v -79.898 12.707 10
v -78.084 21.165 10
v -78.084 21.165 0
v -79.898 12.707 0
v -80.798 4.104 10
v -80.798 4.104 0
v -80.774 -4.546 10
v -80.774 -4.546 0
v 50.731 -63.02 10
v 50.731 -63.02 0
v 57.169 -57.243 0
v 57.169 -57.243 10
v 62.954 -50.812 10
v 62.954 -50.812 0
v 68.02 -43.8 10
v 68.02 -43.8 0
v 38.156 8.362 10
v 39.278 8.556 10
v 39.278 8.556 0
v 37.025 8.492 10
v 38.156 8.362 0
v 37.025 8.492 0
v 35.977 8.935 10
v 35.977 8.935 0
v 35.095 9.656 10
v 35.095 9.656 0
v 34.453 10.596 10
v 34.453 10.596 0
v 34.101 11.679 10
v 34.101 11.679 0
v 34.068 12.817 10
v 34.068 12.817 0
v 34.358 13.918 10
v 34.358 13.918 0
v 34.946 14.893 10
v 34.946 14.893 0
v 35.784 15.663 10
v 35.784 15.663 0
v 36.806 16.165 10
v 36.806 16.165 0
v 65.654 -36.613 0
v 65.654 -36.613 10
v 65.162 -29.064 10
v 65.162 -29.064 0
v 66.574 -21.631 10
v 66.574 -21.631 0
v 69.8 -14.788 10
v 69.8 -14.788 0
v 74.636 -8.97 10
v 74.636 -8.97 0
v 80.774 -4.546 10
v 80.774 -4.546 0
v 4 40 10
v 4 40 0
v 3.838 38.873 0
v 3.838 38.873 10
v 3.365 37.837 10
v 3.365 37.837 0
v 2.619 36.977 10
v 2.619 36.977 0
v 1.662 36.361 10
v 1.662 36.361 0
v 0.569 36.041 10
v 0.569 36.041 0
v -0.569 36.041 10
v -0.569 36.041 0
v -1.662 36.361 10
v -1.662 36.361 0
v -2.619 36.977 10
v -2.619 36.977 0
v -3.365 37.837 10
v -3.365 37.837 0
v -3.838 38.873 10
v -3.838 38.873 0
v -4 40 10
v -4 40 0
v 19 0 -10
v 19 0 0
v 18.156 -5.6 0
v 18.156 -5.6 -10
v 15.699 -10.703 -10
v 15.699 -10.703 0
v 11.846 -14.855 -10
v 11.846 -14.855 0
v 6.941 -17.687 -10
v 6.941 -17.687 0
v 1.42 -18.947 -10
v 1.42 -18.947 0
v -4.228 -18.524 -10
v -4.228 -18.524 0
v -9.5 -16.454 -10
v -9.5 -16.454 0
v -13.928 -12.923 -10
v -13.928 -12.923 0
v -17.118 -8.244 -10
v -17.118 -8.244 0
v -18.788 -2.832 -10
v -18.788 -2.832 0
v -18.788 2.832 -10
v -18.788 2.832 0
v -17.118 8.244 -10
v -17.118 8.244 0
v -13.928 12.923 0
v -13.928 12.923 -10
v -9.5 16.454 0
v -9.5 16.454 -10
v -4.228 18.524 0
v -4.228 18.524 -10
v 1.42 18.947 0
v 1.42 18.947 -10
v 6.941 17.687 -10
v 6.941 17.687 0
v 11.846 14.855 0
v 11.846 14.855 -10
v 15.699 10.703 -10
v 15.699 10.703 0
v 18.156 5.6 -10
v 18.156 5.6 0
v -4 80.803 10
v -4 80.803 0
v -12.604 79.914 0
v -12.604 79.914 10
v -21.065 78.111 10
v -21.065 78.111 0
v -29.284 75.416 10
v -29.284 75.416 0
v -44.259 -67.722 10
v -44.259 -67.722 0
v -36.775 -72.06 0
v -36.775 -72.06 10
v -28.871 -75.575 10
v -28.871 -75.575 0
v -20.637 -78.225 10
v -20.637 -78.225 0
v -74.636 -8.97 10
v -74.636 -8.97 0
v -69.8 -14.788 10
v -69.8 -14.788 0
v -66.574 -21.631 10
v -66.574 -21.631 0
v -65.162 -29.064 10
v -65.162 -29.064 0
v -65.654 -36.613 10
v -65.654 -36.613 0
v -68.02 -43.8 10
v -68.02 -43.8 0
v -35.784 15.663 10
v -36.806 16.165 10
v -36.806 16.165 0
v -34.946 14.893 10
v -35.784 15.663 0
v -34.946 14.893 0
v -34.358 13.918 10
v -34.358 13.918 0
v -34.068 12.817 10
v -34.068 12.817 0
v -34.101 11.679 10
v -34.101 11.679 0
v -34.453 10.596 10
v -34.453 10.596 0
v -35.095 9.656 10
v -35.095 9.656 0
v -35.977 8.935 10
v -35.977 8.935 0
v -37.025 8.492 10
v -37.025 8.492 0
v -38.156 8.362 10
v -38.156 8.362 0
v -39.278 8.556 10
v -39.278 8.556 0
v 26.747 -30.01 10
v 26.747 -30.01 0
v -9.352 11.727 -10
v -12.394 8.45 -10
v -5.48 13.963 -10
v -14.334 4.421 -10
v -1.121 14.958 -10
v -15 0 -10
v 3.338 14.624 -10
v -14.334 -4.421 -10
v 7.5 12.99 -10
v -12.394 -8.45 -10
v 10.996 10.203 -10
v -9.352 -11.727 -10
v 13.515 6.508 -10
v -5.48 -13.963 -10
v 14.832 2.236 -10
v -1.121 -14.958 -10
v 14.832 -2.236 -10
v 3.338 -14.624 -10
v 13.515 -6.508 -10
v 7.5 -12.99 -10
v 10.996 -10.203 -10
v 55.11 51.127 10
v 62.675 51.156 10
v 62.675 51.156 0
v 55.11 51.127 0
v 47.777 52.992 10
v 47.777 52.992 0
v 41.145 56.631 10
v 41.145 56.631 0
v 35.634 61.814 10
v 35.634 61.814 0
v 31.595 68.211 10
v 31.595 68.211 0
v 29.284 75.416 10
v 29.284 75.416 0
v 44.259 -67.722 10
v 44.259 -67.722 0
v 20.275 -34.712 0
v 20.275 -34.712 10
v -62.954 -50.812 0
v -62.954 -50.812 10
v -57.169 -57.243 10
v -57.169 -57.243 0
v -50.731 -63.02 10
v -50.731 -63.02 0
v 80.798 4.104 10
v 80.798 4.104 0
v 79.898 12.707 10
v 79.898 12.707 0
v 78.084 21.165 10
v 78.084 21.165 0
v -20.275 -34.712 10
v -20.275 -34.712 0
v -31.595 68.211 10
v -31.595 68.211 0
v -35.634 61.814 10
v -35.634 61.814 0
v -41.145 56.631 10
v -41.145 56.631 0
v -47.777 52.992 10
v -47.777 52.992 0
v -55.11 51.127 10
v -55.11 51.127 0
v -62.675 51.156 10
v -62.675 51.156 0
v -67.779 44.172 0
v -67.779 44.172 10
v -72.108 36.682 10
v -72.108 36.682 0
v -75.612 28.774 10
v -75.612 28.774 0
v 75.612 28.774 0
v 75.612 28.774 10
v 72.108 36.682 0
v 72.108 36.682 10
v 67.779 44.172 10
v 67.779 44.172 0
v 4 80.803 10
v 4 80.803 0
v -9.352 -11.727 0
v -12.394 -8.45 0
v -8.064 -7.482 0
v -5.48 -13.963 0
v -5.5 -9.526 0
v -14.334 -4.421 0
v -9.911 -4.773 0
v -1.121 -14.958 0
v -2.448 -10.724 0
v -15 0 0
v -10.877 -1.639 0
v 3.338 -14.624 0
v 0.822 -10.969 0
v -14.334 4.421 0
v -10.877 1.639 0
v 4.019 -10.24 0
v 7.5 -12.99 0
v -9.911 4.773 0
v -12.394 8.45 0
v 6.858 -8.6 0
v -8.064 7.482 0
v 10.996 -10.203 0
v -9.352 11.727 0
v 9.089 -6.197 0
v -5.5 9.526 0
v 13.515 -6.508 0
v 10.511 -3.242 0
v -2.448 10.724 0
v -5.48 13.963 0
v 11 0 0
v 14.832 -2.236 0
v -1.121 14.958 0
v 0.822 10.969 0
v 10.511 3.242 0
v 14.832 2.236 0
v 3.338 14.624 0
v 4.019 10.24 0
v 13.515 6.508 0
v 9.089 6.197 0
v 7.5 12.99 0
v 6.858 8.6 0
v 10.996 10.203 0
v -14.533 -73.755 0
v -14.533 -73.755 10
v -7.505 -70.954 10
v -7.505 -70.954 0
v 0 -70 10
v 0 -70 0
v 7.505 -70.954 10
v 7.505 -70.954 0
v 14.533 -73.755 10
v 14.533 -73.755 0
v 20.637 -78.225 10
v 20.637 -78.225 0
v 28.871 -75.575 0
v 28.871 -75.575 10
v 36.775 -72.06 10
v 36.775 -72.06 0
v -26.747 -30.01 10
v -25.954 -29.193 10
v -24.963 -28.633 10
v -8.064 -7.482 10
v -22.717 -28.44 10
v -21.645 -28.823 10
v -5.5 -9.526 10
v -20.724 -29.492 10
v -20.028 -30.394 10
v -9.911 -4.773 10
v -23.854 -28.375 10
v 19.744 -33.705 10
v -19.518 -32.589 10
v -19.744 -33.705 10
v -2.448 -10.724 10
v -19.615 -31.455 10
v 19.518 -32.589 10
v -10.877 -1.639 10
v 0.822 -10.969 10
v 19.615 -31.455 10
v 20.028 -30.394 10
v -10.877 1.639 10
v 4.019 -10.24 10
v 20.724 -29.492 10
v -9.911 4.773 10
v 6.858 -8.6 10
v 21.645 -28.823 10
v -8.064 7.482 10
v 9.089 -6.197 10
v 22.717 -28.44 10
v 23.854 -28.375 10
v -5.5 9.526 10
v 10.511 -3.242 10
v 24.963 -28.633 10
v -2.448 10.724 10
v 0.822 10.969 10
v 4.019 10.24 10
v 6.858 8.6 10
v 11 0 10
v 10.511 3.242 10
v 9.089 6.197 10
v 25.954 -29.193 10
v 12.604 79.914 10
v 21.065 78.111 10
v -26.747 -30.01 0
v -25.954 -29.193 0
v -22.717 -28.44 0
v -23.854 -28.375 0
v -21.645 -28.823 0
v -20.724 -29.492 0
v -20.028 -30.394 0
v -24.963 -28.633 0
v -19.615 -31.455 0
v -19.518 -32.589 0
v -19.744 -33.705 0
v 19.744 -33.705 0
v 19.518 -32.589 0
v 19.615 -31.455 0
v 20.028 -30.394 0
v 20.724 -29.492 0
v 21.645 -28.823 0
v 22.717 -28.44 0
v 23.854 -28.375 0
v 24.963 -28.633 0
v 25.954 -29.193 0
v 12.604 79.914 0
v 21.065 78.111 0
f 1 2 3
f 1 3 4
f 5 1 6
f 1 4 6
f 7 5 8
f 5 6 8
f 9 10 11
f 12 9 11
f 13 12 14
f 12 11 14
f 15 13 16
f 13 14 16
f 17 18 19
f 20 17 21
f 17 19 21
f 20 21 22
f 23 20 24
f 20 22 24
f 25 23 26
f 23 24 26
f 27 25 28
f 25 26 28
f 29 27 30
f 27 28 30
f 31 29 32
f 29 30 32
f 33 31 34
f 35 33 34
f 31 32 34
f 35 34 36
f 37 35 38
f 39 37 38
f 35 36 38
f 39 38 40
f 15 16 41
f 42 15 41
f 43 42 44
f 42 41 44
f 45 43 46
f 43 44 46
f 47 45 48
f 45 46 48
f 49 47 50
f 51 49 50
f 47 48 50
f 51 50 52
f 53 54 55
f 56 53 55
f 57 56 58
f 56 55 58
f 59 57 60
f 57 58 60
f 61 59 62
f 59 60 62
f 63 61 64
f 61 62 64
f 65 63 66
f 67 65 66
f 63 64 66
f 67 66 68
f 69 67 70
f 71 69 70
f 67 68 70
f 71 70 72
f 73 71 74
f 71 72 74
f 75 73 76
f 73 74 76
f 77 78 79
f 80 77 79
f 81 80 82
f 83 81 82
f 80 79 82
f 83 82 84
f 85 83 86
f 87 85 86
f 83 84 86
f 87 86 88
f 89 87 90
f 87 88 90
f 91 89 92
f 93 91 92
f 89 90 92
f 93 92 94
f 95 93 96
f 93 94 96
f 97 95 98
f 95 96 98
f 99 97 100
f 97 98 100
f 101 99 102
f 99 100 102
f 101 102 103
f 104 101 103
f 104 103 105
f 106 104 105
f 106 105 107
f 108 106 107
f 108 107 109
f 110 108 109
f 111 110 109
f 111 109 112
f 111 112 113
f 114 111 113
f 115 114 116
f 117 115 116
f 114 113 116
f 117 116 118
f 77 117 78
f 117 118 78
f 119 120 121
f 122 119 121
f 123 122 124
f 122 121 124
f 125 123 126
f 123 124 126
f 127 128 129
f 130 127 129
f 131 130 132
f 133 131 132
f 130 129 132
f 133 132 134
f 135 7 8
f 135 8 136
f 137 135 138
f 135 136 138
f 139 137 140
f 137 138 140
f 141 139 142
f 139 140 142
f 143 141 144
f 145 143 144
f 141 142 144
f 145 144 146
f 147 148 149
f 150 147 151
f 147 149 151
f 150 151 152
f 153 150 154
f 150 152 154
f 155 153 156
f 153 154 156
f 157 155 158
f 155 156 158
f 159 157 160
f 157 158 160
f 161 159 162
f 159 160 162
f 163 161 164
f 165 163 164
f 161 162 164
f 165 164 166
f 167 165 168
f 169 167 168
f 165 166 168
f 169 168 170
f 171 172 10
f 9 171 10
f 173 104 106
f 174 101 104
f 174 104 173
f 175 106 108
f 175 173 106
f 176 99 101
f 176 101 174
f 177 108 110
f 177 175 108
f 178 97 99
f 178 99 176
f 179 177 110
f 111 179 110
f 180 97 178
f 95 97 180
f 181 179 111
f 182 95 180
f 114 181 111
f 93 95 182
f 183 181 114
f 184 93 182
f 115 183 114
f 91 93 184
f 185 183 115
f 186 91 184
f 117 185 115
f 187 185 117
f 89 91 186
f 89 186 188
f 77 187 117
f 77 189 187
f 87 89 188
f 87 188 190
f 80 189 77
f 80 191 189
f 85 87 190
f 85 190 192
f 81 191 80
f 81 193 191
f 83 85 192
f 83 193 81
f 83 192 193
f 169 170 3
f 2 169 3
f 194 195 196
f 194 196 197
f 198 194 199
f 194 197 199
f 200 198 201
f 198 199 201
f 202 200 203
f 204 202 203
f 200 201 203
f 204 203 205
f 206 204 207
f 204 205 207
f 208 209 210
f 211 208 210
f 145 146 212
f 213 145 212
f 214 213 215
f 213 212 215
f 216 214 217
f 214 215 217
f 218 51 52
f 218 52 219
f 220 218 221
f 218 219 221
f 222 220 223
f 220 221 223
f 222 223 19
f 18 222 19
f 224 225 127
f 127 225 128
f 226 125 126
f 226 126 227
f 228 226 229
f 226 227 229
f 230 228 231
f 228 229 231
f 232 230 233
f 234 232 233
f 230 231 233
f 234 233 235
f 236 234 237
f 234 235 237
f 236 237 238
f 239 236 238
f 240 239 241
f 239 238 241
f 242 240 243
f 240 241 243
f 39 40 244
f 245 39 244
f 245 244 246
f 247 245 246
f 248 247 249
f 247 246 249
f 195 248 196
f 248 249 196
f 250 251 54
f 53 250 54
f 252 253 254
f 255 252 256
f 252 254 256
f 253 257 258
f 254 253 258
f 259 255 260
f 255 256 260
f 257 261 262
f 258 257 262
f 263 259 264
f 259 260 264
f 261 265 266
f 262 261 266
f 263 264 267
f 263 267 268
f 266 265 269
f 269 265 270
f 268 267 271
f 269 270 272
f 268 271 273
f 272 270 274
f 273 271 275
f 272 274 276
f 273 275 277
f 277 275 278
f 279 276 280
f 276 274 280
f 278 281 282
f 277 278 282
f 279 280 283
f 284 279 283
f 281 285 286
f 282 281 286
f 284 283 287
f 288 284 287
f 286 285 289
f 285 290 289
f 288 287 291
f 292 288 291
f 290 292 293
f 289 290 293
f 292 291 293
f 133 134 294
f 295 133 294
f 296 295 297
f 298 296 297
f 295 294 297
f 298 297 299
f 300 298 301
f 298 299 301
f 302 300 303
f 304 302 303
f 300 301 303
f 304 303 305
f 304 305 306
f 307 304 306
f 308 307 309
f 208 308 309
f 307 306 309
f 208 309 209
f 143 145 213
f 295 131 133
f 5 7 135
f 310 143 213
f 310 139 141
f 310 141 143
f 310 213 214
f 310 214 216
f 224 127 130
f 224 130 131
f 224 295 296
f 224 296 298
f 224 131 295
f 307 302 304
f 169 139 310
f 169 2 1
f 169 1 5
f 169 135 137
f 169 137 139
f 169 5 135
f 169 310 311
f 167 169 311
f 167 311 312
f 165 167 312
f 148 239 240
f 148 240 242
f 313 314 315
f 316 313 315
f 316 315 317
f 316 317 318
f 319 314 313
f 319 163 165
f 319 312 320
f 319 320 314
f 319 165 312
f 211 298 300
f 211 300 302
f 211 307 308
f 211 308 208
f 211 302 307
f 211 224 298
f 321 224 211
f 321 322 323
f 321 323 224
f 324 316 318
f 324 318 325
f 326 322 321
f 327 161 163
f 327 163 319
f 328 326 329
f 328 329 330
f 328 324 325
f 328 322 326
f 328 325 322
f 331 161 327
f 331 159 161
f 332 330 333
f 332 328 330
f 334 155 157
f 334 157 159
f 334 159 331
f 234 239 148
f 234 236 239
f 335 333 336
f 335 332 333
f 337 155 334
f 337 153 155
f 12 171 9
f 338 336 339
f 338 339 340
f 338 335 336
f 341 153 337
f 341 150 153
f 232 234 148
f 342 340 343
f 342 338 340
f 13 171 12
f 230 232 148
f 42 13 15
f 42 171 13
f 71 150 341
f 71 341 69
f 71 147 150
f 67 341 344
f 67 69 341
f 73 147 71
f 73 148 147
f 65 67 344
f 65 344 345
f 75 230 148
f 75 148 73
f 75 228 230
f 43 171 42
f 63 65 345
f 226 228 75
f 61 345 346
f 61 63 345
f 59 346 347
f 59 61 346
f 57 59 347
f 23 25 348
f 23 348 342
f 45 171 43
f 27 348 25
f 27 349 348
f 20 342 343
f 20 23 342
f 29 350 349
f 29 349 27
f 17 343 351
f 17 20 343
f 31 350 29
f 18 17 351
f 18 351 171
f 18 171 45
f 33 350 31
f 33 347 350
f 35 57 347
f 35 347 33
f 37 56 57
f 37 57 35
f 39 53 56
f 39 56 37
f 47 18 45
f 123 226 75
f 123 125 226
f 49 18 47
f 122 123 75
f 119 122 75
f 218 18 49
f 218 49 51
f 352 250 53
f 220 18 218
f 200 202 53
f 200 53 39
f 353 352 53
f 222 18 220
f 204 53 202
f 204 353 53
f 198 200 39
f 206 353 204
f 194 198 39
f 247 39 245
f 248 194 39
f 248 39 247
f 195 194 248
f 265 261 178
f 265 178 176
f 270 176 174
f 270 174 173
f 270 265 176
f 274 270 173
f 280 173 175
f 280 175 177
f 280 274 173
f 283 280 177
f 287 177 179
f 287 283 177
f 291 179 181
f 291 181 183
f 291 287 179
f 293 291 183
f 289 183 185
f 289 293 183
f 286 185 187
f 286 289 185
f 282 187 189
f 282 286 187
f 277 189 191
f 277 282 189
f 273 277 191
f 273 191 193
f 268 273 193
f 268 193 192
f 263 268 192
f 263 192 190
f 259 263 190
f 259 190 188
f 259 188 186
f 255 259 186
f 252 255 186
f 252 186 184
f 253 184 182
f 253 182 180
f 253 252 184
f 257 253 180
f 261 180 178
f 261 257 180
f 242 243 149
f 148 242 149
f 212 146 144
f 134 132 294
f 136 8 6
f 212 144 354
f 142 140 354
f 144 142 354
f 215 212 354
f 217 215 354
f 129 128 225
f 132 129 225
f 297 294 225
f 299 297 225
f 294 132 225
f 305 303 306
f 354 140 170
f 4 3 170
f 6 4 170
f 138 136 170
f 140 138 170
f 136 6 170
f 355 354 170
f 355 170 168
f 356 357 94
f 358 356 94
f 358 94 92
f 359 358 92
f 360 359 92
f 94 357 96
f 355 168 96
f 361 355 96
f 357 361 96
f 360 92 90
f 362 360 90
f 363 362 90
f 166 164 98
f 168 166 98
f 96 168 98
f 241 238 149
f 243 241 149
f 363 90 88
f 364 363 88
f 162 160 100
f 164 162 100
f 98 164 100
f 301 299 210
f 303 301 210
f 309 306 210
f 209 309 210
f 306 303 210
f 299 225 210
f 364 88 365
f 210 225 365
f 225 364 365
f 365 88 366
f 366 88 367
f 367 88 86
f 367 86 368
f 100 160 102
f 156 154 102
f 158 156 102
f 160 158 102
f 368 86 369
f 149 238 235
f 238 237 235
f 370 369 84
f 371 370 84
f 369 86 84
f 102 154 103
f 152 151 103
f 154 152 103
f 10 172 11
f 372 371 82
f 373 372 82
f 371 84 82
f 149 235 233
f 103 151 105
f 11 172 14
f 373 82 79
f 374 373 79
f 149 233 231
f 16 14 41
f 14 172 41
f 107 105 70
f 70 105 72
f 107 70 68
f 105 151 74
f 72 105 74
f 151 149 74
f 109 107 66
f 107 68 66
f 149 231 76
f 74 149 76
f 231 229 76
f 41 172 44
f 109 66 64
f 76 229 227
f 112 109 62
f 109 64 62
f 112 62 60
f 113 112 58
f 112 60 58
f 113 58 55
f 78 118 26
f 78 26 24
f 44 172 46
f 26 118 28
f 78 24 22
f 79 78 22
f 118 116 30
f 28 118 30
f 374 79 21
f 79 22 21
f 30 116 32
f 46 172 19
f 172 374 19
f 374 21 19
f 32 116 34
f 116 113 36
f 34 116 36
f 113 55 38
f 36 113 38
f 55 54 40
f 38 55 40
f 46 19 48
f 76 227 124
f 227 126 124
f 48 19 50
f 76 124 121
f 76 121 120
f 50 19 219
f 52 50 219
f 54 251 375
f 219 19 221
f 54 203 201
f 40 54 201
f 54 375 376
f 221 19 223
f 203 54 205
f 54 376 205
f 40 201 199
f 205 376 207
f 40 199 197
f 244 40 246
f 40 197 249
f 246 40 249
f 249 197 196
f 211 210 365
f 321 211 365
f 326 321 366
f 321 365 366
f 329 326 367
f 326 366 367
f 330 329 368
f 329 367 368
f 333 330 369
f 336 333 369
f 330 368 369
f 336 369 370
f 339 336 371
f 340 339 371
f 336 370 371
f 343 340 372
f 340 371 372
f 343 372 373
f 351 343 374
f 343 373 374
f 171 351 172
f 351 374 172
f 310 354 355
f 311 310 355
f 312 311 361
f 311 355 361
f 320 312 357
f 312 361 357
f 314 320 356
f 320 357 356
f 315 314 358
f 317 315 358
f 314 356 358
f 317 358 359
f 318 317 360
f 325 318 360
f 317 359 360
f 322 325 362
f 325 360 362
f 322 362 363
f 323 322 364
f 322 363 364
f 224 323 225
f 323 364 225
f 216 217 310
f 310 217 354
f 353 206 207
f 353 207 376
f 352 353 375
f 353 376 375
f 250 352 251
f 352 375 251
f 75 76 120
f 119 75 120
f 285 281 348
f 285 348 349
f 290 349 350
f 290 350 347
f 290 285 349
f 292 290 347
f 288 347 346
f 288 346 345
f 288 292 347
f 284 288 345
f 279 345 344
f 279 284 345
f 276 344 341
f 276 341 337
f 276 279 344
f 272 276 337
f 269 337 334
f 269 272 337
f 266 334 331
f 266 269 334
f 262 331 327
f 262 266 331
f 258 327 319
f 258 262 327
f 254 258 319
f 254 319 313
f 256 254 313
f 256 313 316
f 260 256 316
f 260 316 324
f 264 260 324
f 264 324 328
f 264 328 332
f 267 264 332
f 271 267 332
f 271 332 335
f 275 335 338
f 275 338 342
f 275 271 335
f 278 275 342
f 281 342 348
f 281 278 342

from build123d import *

# Parameters (mm, degrees)
SKETCH2_R           = 11
BOSS_EXTRUDE1_DEPTH = 10
SKETCH4_R           = 19
SKETCH4_R_2         = 15
BOSS_EXTRUDE2_DEPTH = 10


with BuildPart() as part:
    # Sketch2 → Boss-Extrude1 (new body)
    with BuildSketch(Plane.XY):
        with BuildLine():
            Line((26.747478069, -30.009538766), (50.730734825, -63.019659758))
            ThreePointArc((50.730734825, -63.019659758), (60.147924382, -54.104640877), (68.019750294, -43.79952673))
            ThreePointArc((68.019750294, -43.79952673), (66.573956141, -21.631189606), (80.773849811, -4.546444618))
            ThreePointArc((80.773849811, -4.546444618), (80.462602989, 8.417511037), (78.084053221, 21.165197956))
            Line((78.084053221, 21.165197956), (39.278328629, 8.55645371))
            ThreePointArc((39.278328629, 8.55645371), (34.238034587, 11.124611797), (36.806192674, 16.16490584))
            Line((36.806192674, 16.16490584), (75.611917266, 28.773650086))
            ThreePointArc((75.611917266, 28.773650086), (70.043302078, 40.484821919), (62.675084101, 51.155828649))
            ThreePointArc((62.675084101, 51.155828649), (41.14496766, 56.631189606), (29.284418072, 75.415567558))
            ThreePointArc((29.284418072, 75.415567558), (16.858783013, 79.125636852), (4, 80.802753492))
            Line((4, 80.802753492), (4, 40))
            ThreePointArc((4, 40), (0, 36), (-4, 40))
            Line((-4, 40), (-4, 80.802753492))
            ThreePointArc((-4, 80.802753492), (-16.858783013, 79.125636852), (-29.284418072, 75.415567558))
            ThreePointArc((-29.284418072, 75.415567558), (-41.14496766, 56.631189606), (-62.675084101, 51.155828649))
            ThreePointArc((-62.675084101, 51.155828649), (-70.043302078, 40.484821919), (-75.611917266, 28.773650086))
            Line((-75.611917266, 28.773650086), (-36.806192674, 16.16490584))
            ThreePointArc((-36.806192674, 16.16490584), (-34.238034587, 11.124611797), (-39.278328629, 8.55645371))
            Line((-39.278328629, 8.55645371), (-78.084053221, 21.165197956))
            ThreePointArc((-78.084053221, 21.165197956), (-80.462602989, 8.417511037), (-80.773849811, -4.546444618))
            ThreePointArc((-80.773849811, -4.546444618), (-66.573956141, -21.631189606), (-68.019750294, -43.79952673))
            ThreePointArc((-68.019750294, -43.79952673), (-60.147924382, -54.104640877), (-50.730734825, -63.019659758))
            Line((-50.730734825, -63.019659758), (-26.747478069, -30.009538766))
            ThreePointArc((-26.747478069, -30.009538766), (-21.160269083, -29.124611797), (-20.275342114, -34.711820784))
            Line((-20.275342114, -34.711820784), (-44.25859887, -67.721941776))
            ThreePointArc((-44.25859887, -67.721941776), (-32.869840458, -73.92332893), (-20.636566513, -78.225424859))
            ThreePointArc((-20.636566513, -78.225424859), (0, -70), (20.636566513, -78.225424859))
            ThreePointArc((20.636566513, -78.225424859), (32.869840458, -73.92332893), (44.25859887, -67.721941776))
            Line((44.25859887, -67.721941776), (20.275342114, -34.711820784))
            ThreePointArc((20.275342114, -34.711820784), (21.160269083, -29.124611797), (26.747478069, -30.009538766))
        make_face()
        Circle(SKETCH2_R, mode=Mode.SUBTRACT)
    extrude(amount=BOSS_EXTRUDE1_DEPTH)

    # Sketch4 → Boss-Extrude2 (add)
    with BuildSketch(Plane(origin=(0, 0, 0), x_dir=(-1, 0, 0), z_dir=(0, 0, -1))):
        with Locations(Location((0, 0, 0), (0, 0, 180))):
            Circle(SKETCH4_R)
        Circle(SKETCH4_R_2, mode=Mode.SUBTRACT)
    extrude(amount=BOSS_EXTRUDE2_DEPTH)


solid = part.part
